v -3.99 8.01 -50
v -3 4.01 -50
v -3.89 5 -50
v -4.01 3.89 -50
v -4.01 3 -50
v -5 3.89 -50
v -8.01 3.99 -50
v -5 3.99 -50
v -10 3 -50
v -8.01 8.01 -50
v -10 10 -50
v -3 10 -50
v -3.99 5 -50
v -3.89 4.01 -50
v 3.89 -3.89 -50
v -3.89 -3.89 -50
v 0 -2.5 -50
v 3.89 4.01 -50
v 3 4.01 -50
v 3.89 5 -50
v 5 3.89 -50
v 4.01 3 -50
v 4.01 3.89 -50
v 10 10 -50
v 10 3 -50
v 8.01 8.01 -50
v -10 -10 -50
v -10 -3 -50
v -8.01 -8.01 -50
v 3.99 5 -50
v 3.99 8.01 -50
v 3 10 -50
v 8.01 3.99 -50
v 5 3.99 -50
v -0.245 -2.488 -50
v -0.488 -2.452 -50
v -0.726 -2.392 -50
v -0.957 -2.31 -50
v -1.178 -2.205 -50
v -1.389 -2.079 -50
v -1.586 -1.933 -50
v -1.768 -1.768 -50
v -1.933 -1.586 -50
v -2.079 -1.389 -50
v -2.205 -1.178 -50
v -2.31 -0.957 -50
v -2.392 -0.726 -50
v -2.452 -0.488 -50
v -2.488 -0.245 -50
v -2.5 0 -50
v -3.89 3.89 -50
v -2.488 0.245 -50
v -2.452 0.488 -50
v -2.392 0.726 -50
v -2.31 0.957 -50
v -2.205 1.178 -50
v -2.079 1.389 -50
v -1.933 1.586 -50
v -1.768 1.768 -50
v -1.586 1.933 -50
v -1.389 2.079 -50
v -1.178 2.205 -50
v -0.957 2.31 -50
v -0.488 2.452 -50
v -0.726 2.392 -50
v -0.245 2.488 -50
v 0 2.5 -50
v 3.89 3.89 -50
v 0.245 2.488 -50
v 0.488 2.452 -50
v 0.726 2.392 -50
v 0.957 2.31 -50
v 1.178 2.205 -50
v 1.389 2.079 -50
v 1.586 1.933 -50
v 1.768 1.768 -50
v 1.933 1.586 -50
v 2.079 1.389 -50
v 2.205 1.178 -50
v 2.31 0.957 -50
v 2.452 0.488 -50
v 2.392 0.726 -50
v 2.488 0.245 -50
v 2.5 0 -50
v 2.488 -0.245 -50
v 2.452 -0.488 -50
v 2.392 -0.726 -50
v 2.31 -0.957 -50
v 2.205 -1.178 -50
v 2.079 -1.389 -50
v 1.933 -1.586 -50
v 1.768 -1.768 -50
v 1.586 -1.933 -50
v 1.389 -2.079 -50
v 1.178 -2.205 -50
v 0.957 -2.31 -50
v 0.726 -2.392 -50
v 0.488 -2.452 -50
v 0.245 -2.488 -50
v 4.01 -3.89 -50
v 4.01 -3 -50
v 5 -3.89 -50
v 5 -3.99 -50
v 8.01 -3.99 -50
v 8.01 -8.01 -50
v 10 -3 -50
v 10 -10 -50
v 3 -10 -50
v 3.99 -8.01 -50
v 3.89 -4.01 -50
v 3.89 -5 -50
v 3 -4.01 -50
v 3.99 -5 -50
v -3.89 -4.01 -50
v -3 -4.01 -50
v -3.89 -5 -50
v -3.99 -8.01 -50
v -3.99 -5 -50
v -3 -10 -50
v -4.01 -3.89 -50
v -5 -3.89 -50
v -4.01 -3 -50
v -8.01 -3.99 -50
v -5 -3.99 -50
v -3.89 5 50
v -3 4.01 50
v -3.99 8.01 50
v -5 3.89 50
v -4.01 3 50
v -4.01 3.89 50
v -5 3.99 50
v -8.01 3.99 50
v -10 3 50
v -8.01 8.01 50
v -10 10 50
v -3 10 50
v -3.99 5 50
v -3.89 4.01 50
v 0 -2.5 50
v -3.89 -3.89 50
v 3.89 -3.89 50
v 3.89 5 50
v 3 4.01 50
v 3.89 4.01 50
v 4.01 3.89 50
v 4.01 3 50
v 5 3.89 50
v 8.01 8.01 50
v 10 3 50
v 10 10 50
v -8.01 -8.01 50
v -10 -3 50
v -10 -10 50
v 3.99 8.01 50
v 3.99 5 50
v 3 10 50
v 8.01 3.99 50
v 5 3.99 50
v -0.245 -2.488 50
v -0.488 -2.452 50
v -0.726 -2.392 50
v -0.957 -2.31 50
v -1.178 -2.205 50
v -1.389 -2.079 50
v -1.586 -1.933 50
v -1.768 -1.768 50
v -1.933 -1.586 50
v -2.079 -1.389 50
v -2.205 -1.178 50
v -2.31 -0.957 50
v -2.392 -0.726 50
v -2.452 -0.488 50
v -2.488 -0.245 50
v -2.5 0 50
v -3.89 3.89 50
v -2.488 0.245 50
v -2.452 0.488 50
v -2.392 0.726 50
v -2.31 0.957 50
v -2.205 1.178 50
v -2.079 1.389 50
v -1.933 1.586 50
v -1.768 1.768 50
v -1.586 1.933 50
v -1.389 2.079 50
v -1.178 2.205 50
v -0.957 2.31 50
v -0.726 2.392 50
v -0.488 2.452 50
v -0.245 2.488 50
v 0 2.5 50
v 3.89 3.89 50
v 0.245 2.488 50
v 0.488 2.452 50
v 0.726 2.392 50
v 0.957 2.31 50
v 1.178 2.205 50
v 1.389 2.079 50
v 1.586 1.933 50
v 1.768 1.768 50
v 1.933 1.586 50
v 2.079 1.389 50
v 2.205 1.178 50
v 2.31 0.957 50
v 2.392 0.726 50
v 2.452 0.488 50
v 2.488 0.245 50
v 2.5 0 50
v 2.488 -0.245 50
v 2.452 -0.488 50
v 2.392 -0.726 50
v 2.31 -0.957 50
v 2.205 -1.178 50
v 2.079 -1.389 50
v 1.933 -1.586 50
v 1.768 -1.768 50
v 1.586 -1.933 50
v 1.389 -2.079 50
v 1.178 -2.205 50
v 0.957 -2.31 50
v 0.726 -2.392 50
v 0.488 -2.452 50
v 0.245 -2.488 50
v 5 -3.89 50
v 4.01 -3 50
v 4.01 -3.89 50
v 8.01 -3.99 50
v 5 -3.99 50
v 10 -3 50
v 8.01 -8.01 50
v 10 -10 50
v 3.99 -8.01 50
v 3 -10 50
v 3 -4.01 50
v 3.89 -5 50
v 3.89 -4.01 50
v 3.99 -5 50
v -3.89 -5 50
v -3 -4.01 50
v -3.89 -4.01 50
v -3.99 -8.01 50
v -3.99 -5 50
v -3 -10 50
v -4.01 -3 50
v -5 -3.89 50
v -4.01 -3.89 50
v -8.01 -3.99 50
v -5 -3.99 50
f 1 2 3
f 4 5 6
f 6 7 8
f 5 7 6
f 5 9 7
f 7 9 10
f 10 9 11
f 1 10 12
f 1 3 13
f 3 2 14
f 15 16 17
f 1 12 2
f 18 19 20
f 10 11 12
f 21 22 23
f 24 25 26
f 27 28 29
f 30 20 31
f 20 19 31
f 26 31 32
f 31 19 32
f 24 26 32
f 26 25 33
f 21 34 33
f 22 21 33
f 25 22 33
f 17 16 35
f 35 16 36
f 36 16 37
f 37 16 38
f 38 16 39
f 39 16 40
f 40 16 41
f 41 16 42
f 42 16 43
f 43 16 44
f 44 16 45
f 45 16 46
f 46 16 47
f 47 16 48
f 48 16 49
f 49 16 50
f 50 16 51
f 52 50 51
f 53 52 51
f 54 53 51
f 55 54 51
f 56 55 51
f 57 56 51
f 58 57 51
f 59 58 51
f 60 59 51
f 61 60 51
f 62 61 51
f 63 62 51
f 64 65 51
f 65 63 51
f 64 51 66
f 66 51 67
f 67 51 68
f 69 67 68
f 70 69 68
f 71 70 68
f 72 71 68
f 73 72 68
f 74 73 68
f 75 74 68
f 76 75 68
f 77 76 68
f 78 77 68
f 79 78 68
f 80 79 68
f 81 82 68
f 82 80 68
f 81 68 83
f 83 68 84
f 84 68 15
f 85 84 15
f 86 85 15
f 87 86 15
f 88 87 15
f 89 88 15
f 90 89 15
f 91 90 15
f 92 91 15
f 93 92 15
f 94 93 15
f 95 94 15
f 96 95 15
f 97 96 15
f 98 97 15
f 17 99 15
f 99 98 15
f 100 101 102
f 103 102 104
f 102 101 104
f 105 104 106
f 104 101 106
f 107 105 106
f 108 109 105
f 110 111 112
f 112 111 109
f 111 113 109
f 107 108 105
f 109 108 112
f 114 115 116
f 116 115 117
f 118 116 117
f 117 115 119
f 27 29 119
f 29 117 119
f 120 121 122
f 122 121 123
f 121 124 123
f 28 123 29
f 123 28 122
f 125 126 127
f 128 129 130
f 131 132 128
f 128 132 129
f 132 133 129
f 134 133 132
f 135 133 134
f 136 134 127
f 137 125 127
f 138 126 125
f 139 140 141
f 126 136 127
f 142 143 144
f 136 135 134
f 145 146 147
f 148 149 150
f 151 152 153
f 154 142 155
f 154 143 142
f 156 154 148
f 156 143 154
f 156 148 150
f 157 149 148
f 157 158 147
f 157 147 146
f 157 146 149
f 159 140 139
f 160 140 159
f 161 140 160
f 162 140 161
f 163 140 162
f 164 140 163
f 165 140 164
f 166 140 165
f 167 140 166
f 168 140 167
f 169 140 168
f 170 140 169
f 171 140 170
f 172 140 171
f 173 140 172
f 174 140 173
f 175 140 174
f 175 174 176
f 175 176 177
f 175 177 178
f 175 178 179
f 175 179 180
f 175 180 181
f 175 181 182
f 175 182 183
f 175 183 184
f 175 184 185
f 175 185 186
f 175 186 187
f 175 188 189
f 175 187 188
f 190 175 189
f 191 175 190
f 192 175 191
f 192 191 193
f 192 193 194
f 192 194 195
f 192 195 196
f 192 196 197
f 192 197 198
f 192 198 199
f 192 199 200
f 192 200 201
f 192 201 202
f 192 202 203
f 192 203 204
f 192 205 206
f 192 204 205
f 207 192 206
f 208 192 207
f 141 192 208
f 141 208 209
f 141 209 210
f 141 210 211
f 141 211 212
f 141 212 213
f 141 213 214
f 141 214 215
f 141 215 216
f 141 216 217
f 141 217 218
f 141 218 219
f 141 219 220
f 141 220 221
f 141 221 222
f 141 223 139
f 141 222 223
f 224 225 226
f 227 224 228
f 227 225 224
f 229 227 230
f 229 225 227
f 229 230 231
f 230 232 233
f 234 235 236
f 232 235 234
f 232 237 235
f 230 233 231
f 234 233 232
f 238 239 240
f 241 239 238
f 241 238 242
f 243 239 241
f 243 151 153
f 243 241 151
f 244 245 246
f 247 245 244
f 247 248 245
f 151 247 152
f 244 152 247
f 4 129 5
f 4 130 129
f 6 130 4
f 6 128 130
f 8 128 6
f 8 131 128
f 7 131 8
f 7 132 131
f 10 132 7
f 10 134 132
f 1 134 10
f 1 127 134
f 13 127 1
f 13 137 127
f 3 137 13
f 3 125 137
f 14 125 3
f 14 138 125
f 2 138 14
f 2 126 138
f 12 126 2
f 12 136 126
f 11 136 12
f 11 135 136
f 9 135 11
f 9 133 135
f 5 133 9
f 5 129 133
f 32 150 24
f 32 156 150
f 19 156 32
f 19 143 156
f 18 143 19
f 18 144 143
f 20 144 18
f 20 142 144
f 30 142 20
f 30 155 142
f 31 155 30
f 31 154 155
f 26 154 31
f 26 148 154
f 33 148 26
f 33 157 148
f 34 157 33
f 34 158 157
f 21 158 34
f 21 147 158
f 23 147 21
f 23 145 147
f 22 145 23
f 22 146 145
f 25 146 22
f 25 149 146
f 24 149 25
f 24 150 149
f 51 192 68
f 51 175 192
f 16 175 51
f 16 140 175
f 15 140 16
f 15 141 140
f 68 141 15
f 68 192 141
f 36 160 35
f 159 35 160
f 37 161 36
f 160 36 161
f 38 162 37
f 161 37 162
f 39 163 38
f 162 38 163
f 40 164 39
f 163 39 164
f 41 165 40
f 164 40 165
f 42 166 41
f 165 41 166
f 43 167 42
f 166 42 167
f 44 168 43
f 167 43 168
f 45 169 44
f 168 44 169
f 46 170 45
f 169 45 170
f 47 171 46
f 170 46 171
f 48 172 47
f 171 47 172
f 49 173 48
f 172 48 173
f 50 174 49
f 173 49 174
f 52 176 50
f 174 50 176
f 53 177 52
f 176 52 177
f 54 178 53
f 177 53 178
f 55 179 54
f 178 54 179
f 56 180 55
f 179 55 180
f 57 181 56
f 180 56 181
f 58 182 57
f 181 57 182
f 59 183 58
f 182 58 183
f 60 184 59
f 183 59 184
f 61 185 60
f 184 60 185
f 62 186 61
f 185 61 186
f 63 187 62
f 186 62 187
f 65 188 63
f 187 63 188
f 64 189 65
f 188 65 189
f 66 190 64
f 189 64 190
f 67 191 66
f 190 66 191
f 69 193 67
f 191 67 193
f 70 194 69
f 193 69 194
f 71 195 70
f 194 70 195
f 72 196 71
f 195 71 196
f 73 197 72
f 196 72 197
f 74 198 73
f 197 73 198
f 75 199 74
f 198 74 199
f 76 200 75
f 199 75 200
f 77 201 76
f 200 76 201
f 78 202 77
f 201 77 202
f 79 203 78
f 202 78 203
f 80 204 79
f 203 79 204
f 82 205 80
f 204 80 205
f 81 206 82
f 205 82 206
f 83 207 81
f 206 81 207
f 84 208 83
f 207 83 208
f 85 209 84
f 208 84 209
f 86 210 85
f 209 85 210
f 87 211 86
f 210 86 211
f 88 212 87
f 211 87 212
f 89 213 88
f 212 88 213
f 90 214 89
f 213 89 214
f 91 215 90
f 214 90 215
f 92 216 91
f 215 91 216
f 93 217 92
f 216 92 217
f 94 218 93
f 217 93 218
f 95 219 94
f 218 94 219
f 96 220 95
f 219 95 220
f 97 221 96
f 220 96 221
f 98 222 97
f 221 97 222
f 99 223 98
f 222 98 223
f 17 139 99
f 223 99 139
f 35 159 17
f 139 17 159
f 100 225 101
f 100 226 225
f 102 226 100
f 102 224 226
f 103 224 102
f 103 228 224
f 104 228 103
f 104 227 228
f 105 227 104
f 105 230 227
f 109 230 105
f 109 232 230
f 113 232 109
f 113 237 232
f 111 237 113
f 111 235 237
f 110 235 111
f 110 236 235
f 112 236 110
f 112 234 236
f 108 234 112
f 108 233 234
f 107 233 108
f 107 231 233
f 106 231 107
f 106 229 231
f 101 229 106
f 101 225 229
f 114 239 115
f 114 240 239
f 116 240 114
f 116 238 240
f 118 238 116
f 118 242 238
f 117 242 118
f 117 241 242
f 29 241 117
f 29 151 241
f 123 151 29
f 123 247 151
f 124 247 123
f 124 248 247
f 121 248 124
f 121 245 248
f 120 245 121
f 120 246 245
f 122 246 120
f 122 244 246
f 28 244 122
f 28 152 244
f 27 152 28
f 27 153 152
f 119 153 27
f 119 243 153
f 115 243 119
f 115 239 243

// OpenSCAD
// 20x20 T-slot aluminium extrusion profile, 100mm long
// Single connected solid, dimensions derived from parameters.

$fn = 64;

size = 20.0;   // cross-section width/height (mm)
len  = 100.0;  // extrusion length (mm)

// Proportions (kept conservative to ensure a connected, printable solid)
wall       = 2.0;   // outer wall thickness
core_size  = 8.0;   // central solid square (keeps everything connected)
bore_r     = 2.5;   // center bore radius

slot_open  = 6.0;   // opening width at each face
slot_depth = 6.0;   // depth of the slot from the face inward
slot_wide  = 10.0;  // wider internal pocket width (T-slot cavity)

eps = 0.02;

module cross_section_2020() {
    // Derived clearances
    half = size/2;

    // Ensure the slot pocket does not cut into the core
    // Pocket length from inner end of face-slot to near the core
    pocket_len = max(0.1, (half - wall) - (half - slot_depth) - core_size/2);
    // Equivalent: pocket_len = max(0.1, slot_depth - wall - core_size/2 + half - half) -> simplified above

    difference() {
        // Outer boundary
        square([size, size], center=true);

        // Central bore
        circle(r=bore_r);

        // Four face slots + internal wider pockets (kept away from core)
        for (a = [0, 90, 180, 270]) {
            rotate(a) {
                // Narrow opening cut from the face inward
                translate([0, half - slot_depth/2])
                    square([slot_open, slot_depth + eps], center=true);

                // Wider internal pocket (T cavity), starting just inside the slot
                // and extending toward the core but not into it.
                translate([0, (half - slot_depth) - pocket_len/2])
                    square([slot_wide, pocket_len + eps], center=true);
            }
        }

        // Corner relief voids (leave outer wall and keep connected to core via webs)
        corner_void = max(0, (half - wall) - (core_size/2));
        if (corner_void > 0) {
            for (sx = [-1, 1], sy = [-1, 1]) {
                translate([sx*(core_size/2 + corner_void/2), sy*(core_size/2 + corner_void/2)])
                    square([corner_void + eps, corner_void + eps], center=true);
            }
        }
    }
}

module extrusion_2020(L=len) {
    linear_extrude(height=L, center=true, convexity=10)
        cross_section_2020();
}

extrusion_2020(len);
